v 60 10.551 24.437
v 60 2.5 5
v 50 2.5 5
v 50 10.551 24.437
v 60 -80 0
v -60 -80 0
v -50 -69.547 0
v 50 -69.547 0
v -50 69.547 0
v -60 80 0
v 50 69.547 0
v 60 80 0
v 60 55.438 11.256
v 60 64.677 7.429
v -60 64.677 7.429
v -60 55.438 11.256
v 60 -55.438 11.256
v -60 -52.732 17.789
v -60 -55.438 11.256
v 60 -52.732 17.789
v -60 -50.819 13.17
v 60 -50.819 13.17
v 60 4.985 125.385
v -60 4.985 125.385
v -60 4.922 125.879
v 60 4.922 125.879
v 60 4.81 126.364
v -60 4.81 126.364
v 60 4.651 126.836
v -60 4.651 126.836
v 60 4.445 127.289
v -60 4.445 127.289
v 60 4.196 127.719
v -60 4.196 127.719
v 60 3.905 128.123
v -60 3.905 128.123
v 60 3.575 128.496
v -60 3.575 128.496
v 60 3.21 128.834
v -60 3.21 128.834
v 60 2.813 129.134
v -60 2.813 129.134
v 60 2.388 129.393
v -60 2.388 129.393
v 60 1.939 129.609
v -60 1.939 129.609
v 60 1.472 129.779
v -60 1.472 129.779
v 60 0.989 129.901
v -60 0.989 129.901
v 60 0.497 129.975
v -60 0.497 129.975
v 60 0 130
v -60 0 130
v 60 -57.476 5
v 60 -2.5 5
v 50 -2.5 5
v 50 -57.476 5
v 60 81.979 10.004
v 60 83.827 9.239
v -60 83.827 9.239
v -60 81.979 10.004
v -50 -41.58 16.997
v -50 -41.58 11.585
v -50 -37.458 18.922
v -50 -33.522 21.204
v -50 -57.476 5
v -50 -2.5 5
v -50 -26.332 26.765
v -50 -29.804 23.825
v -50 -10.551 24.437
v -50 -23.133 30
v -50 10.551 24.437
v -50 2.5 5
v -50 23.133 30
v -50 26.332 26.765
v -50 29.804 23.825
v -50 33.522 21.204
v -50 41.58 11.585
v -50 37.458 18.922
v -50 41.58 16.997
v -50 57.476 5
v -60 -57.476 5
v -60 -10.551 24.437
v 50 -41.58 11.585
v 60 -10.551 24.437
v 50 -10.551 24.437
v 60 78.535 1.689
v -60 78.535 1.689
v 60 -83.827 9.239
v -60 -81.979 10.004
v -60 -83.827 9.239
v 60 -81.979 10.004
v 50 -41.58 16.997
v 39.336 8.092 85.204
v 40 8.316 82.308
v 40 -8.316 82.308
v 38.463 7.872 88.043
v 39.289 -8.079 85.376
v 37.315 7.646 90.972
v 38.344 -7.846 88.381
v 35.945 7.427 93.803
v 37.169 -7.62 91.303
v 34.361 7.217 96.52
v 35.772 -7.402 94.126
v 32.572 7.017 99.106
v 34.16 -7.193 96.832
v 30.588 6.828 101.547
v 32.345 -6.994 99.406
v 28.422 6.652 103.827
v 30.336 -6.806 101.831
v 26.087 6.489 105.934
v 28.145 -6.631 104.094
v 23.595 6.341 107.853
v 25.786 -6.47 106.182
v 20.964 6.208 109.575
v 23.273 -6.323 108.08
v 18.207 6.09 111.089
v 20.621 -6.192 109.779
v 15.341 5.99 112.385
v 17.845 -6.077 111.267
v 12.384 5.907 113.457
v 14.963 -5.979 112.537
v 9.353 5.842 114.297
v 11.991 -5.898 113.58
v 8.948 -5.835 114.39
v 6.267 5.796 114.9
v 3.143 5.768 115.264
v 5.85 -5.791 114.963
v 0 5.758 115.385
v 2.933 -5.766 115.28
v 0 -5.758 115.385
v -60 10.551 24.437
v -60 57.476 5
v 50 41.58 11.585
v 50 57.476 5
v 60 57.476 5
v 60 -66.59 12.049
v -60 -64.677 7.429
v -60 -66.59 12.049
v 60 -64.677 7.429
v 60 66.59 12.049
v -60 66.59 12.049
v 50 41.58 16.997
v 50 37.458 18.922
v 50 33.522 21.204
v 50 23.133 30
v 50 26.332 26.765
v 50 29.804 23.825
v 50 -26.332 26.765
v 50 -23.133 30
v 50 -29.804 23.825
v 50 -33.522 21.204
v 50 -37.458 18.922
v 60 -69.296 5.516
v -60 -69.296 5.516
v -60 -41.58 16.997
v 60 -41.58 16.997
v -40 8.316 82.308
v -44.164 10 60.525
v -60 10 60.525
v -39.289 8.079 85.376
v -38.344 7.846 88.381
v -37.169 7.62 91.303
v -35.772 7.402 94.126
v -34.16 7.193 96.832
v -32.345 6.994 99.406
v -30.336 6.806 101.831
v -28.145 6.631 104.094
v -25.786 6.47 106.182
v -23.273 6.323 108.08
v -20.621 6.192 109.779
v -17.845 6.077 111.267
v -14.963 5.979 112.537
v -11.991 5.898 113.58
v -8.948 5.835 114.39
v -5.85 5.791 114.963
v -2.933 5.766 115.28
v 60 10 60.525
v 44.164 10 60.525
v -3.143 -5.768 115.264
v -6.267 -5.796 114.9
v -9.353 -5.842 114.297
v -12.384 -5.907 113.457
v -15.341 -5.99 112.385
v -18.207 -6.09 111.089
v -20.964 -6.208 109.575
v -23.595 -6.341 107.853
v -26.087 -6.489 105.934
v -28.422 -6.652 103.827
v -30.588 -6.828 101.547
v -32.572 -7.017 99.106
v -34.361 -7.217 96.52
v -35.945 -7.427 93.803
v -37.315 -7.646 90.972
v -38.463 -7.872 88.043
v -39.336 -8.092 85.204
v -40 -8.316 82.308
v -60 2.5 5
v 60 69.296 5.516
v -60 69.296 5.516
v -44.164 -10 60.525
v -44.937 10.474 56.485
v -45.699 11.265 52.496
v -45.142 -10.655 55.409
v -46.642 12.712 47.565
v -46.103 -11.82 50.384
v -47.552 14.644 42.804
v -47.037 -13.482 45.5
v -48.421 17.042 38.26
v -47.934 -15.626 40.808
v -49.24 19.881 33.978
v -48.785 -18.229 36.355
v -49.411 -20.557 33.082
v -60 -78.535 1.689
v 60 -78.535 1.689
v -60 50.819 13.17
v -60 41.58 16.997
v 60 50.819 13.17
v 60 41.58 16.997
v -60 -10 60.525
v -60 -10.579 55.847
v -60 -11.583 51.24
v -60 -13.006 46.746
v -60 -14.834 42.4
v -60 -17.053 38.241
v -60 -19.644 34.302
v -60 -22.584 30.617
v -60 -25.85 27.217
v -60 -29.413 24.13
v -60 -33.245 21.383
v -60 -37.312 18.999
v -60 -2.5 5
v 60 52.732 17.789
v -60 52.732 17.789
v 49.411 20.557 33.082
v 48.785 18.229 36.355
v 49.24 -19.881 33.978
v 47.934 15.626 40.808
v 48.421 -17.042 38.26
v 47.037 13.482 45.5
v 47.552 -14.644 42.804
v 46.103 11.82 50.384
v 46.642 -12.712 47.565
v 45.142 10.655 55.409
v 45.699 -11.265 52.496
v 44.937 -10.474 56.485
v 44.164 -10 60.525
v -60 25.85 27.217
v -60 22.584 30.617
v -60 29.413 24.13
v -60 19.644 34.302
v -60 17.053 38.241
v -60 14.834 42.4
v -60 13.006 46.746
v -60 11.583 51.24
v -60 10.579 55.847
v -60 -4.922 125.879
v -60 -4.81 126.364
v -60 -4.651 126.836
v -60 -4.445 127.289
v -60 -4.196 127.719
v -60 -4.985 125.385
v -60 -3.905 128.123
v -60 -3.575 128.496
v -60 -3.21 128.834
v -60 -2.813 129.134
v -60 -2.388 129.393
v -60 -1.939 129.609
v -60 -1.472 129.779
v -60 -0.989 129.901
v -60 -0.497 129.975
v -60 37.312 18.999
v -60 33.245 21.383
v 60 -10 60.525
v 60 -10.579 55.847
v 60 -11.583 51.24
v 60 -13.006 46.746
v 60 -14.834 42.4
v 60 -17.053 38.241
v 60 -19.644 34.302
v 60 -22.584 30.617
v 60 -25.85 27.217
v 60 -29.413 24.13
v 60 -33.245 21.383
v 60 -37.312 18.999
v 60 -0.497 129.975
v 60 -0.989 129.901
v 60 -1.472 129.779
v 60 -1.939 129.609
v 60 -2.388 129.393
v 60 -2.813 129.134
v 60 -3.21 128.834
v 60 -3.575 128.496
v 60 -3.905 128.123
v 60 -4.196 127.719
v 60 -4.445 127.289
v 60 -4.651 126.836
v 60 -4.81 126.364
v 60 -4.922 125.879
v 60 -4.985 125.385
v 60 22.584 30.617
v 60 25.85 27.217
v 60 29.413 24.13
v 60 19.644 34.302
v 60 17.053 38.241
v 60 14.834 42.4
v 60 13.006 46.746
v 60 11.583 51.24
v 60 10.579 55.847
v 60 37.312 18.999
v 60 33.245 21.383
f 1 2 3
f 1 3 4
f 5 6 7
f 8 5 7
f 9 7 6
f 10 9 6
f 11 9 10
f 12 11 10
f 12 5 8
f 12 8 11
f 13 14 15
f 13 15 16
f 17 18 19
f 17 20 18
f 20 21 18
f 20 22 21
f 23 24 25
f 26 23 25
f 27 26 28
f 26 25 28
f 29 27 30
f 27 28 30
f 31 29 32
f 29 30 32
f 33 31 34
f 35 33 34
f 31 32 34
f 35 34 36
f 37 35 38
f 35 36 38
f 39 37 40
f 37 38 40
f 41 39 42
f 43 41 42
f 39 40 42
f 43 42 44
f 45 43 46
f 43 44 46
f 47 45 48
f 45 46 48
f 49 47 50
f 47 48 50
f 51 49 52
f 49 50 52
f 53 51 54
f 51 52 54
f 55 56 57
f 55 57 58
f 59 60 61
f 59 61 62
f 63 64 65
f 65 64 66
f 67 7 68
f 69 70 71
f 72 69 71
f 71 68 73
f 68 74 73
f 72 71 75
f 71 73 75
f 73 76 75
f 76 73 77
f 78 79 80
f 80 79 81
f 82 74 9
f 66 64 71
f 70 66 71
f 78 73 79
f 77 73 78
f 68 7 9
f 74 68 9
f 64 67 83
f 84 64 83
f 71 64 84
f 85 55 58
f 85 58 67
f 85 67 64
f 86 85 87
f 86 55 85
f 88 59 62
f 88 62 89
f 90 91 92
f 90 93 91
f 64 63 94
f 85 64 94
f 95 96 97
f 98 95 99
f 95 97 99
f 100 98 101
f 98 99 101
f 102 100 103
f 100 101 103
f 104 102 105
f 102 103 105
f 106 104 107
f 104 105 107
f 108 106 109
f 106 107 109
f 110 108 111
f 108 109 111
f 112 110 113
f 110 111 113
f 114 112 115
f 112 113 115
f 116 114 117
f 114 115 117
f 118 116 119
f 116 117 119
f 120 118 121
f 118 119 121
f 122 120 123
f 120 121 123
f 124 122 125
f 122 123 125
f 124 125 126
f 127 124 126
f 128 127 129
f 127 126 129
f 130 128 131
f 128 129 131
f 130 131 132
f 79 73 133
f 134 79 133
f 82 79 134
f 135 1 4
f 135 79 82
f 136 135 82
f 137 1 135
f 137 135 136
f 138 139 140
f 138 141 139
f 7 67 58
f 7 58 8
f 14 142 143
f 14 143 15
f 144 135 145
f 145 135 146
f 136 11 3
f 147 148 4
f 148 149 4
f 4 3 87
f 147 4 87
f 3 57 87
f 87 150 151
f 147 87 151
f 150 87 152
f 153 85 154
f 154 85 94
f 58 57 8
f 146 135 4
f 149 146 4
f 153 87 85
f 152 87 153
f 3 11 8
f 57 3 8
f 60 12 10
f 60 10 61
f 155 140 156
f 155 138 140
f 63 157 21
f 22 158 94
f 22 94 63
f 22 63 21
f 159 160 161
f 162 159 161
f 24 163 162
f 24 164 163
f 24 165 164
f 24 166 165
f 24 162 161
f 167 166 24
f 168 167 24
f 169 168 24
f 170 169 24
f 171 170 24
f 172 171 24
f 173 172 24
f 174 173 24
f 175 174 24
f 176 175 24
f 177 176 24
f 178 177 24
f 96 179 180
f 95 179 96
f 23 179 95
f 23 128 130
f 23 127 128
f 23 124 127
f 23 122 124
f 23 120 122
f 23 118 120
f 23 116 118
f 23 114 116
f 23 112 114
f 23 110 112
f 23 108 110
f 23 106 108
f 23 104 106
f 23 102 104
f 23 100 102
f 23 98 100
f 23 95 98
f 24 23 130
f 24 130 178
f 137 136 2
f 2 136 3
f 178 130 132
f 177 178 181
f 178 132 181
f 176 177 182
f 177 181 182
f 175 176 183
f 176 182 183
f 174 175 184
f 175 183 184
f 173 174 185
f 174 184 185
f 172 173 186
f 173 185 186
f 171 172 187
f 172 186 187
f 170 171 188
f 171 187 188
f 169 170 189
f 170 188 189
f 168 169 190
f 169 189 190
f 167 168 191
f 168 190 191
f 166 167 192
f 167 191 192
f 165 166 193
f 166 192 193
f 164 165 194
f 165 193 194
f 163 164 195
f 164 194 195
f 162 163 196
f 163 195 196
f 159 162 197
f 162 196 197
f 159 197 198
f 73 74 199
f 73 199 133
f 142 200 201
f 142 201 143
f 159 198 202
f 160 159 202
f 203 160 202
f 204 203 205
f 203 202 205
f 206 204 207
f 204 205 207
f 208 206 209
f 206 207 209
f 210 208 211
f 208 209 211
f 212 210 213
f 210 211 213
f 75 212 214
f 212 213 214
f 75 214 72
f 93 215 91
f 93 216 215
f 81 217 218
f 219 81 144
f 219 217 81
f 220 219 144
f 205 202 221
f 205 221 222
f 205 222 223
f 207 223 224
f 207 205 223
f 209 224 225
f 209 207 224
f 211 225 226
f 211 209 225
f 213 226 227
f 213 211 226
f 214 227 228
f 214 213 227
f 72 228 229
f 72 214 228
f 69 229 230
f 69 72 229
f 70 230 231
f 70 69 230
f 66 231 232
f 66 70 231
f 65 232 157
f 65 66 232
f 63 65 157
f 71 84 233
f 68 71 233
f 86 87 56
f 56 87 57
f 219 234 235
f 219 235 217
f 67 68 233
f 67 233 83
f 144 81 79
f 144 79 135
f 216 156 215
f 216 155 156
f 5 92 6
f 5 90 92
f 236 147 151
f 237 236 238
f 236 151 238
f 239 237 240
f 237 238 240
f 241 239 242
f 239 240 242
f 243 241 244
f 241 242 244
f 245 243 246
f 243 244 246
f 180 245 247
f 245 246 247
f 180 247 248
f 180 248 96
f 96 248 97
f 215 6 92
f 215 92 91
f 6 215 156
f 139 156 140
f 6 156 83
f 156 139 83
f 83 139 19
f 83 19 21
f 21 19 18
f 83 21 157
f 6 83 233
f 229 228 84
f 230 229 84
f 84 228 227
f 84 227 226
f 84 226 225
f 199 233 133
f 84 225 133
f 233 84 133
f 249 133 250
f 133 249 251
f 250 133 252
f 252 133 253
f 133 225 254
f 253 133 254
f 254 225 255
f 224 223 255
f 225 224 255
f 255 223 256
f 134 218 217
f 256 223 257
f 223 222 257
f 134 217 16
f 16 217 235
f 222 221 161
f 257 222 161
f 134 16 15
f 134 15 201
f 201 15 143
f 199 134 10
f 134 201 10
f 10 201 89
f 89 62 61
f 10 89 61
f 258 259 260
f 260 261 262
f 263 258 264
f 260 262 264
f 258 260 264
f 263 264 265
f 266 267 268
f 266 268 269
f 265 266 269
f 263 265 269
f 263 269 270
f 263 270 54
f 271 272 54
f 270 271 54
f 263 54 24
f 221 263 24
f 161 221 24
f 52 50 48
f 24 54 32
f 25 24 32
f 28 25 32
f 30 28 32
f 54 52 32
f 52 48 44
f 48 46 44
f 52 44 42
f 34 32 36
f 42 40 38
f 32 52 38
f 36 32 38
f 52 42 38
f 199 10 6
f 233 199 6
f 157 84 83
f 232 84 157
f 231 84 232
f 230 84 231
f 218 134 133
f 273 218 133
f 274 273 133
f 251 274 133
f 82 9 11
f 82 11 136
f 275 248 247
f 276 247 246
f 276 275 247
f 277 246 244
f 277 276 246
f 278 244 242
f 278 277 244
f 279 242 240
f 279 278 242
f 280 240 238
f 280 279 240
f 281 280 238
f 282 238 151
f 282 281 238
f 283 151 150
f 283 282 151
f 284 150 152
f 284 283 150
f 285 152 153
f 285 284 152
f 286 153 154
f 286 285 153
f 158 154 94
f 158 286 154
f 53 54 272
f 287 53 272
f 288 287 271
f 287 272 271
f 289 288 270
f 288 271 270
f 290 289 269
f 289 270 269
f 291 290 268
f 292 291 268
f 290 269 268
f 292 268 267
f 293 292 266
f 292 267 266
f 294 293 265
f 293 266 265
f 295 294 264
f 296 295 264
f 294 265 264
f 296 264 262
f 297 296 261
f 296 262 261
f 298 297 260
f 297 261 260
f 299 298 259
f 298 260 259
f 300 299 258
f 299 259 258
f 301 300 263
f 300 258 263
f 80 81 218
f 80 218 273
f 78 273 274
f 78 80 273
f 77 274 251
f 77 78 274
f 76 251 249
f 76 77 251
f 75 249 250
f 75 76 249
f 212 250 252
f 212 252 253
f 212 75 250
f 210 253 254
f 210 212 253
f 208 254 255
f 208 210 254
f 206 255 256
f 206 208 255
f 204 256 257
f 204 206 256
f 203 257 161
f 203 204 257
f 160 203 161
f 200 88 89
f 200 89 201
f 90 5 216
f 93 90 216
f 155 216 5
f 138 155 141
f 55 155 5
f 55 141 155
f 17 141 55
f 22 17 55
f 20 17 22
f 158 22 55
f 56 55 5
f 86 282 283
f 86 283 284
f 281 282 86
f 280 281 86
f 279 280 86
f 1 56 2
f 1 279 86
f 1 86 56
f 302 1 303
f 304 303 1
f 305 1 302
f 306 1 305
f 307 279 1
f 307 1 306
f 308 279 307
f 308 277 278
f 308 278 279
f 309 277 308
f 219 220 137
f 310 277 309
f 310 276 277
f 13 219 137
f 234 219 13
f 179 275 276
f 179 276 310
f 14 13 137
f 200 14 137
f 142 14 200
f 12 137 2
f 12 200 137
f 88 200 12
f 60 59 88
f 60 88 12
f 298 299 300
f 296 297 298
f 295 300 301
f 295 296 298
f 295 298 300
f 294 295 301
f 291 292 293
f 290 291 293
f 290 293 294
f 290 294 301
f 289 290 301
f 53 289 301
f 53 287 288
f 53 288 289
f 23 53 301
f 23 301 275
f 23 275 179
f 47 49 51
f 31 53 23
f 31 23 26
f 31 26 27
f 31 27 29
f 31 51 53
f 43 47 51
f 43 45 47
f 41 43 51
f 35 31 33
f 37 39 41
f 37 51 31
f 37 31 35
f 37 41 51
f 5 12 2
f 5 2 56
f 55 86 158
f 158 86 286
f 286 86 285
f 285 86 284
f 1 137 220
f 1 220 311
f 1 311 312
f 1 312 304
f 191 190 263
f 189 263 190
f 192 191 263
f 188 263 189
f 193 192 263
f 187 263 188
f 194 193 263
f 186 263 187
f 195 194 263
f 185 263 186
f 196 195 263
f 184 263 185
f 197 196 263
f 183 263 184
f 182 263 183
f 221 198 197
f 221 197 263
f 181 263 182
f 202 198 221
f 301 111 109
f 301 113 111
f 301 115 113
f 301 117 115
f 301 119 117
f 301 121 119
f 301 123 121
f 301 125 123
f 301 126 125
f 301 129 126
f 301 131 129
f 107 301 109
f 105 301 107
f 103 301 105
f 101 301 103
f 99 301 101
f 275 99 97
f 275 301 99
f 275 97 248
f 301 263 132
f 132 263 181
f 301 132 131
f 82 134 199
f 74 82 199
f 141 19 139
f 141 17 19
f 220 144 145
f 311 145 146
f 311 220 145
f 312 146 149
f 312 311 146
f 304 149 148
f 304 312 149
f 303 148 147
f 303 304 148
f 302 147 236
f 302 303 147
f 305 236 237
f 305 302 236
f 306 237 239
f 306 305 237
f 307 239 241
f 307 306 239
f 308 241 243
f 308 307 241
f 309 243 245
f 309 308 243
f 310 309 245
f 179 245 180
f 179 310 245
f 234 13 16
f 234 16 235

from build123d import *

# Parameters (mm, degrees)
F1_DEPTH   = 60
F3_DEPTH   = 25
F4_W       = 100
F4_H       = 41.5797430669
F5_DEPTH   = 30.001
F5_FACE_W  = 100
F5_FACE_H  = 5
F6_REACH   = 142.3730132293
F5_FACE1_W = 100
F5_FACE1_H = 5
F7_REACH   = 142.3730132293


with BuildPart() as f1:
    # F0 (on Right) → F1 (new body, symmetric)
    with BuildSketch(Plane.YZ):
        with BuildLine():
            Line((-80, 0), (0, 0))
            Line((0, 0), (80, 0))
            Line((80, 0), (83.8268343237, 9.2387953251))
            Line((83.8268343237, 9.2387953251), (81.9790752586, 10.0041621898))
            Line((81.9790752586, 10.0041621898), (78.5349243673, 1.6892463972))
            Line((78.5349243673, 1.6892463972), (69.2961290422, 5.5160807209))
            Line((69.2961290422, 5.5160807209), (66.5901485415, 12.0488955453))
            Line((66.5901485415, 12.0488955453), (64.6767313797, 7.4294978827))
            Line((64.6767313797, 7.4294978827), (55.4379360546, 11.2563322064))
            Line((55.4379360546, 11.2563322064), (52.7319555538, 17.7891470308))
            Line((52.7319555538, 17.7891470308), (50.818538392, 13.1697493682))
            Line((50.818538392, 13.1697493682), (41.5797430669, 16.9965836918))
            ThreePointArc((41.5797430669, 16.9965836918), (19.6436139822, 34.3018638475), (10, 60.5252730432))
            Line((10, 60.5252730432), (4.9851213736, 125.3854411629))
            ThreePointArc((4.9851213736, 125.3854411629), (3.3965272107, 128.6692782543), (0, 130))
            ThreePointArc((0, 130), (-3.3965272107, 128.6692782543), (-4.9851213736, 125.3854411629))
            Line((-4.9851213736, 125.3854411629), (-10, 60.5252730432))
            ThreePointArc((-10, 60.5252730432), (-19.6436139822, 34.3018638475), (-41.5797430669, 16.9965836918))
            Line((-41.5797430669, 16.9965836918), (-50.818538392, 13.1697493682))
            Line((-50.818538392, 13.1697493682), (-52.7319555538, 17.7891470308))
            Line((-52.7319555538, 17.7891470308), (-55.4379360546, 11.2563322064))
            Line((-55.4379360546, 11.2563322064), (-64.6767313797, 7.4294978827))
            Line((-64.6767313797, 7.4294978827), (-66.5901485415, 12.0488955453))
            Line((-66.5901485415, 12.0488955453), (-69.2961290422, 5.5160807209))
            Line((-69.2961290422, 5.5160807209), (-78.5349243673, 1.6892463972))
            Line((-78.5349243673, 1.6892463972), (-81.9790752586, 10.0041621898))
            Line((-81.9790752586, 10.0041621898), (-83.8268343237, 9.2387953251))
            Line((-83.8268343237, 9.2387953251), (-80, 0))
        make_face()
        Polygon((-10.5511115466, 24.437102688), (-2.5, 5), (-57.4764284691, 5), align=None, mode=Mode.SUBTRACT)
        Polygon((57.4764284691, 5), (2.5, 5), (10.5511115466, 24.437102688), align=None, mode=Mode.SUBTRACT)
    extrude(amount=F1_DEPTH, both=True)

    # F2 (on Front) → F3 (cut, symmetric)
    with BuildSketch(Plane.XZ):
        with BuildLine():
            ThreePointArc((0, 115.3854411629), (-25.9524271926, 106.0449266507), (-40, 82.3080484491))
            Line((-40, 82.3080484491), (-50, 30))
            Line((-50, 30), (0, 30))
            Line((0, 30), (50, 30))
            Line((50, 30), (40, 82.3080484491))
            ThreePointArc((40, 82.3080484491), (25.9524271926, 106.0449266507), (0, 115.3854411629))
        make_face()
    extrude(amount=F3_DEPTH, both=True, mode=Mode.SUBTRACT)

    # F4 (on face) → F5 (cut, through all)
    with BuildSketch(Plane.XY.offset(30)):
        with Locations((0, 20.7898715334)):
            Rectangle(F4_W, F4_H)
        with Locations((0, -20.7898715334)):
            Rectangle(F4_W, F4_H)
    extrude(amount=-F5_DEPTH, mode=Mode.SUBTRACT)

    f6_end = Plane(origin=(0, 43.7688782858, 10.6778531928), x_dir=(0, -0.9238795325, 0.3826834324), z_dir=(0, -0.3826834324, -0.9238795325))
    # F5_face (on face) → F6 (cut, up to a plane its end follows)
    with BuildSketch(Plane(origin=(0, 41.5797430669, 2.5), x_dir=(1, 0, 0), z_dir=(0, -1, 0))):
        Rectangle(F5_FACE_W, F5_FACE_H)
    f6_long = extrude(amount=-F6_REACH, mode=Mode.PRIVATE)
    add(split(f6_long, bisect_by=f6_end, keep=Keep.TOP, mode=Mode.PRIVATE), mode=Mode.SUBTRACT)

    f7_end = Plane(origin=(0, -43.7688782858, 10.6778531928), x_dir=(0, -0.9238795325, -0.3826834324), z_dir=(0, 0.3826834324, -0.9238795325))
    # F5_face1 (on face) → F7 (cut, up to a plane its end follows)
    with BuildSketch(Plane(origin=(0, -41.5797430669, 2.5), x_dir=(-1, 0, 0), z_dir=(0, 1, 0))):
        Rectangle(F5_FACE1_W, F5_FACE1_H)
    f7_long = extrude(amount=-F7_REACH, mode=Mode.PRIVATE)
    add(split(f7_long, bisect_by=f7_end, keep=Keep.TOP, mode=Mode.PRIVATE), mode=Mode.SUBTRACT)


solid = f1.part
